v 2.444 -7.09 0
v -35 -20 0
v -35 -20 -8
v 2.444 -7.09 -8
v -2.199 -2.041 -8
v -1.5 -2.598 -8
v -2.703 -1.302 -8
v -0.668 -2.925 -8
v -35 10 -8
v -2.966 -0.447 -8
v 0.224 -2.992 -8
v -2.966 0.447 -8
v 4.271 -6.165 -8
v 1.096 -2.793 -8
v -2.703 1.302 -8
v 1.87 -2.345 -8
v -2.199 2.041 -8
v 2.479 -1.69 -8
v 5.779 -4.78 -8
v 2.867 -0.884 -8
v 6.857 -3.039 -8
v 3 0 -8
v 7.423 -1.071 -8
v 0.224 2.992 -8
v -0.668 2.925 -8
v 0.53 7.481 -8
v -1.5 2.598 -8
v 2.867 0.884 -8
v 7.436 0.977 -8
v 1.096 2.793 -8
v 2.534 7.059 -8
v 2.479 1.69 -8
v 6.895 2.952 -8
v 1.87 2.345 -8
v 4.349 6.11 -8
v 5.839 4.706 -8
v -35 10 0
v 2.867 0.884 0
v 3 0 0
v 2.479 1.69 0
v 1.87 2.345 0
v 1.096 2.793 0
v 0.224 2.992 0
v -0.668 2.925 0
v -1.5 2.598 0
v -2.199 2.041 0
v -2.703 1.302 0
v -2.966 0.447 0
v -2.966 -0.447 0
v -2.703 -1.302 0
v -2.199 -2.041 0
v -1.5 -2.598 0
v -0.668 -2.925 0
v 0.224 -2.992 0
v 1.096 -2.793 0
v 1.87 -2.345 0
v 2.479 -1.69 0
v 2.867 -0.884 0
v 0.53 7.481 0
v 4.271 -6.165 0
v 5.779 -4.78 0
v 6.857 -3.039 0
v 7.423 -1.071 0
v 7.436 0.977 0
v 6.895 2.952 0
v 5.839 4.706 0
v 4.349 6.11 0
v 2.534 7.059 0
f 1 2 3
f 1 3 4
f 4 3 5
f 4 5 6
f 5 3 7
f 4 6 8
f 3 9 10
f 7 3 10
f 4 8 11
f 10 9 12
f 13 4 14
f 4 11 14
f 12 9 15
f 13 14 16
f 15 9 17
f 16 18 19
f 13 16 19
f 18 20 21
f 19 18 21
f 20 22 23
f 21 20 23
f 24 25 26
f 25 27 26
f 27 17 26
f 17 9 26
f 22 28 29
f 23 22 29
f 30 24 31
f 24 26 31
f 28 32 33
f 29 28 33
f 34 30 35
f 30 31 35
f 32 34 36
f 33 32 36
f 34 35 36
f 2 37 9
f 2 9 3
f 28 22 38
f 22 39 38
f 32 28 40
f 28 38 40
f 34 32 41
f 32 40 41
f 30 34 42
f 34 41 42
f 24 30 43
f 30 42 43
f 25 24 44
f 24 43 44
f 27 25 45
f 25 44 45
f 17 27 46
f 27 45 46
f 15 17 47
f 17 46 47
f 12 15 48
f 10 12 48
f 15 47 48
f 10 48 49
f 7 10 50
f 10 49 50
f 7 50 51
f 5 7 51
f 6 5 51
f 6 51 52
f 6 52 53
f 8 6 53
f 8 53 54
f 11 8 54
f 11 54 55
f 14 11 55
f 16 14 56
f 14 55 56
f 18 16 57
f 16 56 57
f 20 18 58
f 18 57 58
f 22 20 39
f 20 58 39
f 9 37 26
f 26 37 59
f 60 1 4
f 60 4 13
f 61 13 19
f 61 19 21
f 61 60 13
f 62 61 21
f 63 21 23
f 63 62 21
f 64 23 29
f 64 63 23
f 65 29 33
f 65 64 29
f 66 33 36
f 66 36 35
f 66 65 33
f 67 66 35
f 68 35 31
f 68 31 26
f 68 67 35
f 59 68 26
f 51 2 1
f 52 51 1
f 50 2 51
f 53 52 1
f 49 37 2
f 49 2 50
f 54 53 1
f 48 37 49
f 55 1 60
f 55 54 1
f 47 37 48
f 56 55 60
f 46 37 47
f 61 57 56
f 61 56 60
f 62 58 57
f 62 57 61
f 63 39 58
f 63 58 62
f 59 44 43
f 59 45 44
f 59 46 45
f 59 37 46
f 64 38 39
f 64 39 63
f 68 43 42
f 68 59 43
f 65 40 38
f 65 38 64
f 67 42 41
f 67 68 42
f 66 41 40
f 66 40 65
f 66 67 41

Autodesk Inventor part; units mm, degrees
ref_plane "YZ Plane" through (0, 0, 0) normal (1, 0, 0) x (0, 1, 0)
ref_plane "XZ Plane" through (0, 0, 0) normal (0, 1, 0) x (-1, 0, 0)
ref_plane "XY Plane" through (0, 0, 0) normal (0, 0, 1) x (1, 0, 0)
sketch "Sketch1" plane through (0, 0, 0) normal (0, 0, 1) x (1, 0, 0)
  circle A0 centre (0, 0) radius 3
  arc A1 (2.4445, -7.0904) -> (0.5304, 7.4812) centre (0, 0) ccw
  line L0 (-35, 10) -> (-35, -20)
  line L1 (-35, 10) -> (0.5304, 7.4812)
  line L2 (-35, -20) -> (2.4445, -7.0904)
  dimension "d0" = 6
  dimension "d1" = 15
  dimension "d2" = 35
  dimension "d3" = 10
  dimension "d4" = 30
extrude "Extrusion1" add sketch "Sketch1" against normal blind 8
properties part number "BaseHinge"
